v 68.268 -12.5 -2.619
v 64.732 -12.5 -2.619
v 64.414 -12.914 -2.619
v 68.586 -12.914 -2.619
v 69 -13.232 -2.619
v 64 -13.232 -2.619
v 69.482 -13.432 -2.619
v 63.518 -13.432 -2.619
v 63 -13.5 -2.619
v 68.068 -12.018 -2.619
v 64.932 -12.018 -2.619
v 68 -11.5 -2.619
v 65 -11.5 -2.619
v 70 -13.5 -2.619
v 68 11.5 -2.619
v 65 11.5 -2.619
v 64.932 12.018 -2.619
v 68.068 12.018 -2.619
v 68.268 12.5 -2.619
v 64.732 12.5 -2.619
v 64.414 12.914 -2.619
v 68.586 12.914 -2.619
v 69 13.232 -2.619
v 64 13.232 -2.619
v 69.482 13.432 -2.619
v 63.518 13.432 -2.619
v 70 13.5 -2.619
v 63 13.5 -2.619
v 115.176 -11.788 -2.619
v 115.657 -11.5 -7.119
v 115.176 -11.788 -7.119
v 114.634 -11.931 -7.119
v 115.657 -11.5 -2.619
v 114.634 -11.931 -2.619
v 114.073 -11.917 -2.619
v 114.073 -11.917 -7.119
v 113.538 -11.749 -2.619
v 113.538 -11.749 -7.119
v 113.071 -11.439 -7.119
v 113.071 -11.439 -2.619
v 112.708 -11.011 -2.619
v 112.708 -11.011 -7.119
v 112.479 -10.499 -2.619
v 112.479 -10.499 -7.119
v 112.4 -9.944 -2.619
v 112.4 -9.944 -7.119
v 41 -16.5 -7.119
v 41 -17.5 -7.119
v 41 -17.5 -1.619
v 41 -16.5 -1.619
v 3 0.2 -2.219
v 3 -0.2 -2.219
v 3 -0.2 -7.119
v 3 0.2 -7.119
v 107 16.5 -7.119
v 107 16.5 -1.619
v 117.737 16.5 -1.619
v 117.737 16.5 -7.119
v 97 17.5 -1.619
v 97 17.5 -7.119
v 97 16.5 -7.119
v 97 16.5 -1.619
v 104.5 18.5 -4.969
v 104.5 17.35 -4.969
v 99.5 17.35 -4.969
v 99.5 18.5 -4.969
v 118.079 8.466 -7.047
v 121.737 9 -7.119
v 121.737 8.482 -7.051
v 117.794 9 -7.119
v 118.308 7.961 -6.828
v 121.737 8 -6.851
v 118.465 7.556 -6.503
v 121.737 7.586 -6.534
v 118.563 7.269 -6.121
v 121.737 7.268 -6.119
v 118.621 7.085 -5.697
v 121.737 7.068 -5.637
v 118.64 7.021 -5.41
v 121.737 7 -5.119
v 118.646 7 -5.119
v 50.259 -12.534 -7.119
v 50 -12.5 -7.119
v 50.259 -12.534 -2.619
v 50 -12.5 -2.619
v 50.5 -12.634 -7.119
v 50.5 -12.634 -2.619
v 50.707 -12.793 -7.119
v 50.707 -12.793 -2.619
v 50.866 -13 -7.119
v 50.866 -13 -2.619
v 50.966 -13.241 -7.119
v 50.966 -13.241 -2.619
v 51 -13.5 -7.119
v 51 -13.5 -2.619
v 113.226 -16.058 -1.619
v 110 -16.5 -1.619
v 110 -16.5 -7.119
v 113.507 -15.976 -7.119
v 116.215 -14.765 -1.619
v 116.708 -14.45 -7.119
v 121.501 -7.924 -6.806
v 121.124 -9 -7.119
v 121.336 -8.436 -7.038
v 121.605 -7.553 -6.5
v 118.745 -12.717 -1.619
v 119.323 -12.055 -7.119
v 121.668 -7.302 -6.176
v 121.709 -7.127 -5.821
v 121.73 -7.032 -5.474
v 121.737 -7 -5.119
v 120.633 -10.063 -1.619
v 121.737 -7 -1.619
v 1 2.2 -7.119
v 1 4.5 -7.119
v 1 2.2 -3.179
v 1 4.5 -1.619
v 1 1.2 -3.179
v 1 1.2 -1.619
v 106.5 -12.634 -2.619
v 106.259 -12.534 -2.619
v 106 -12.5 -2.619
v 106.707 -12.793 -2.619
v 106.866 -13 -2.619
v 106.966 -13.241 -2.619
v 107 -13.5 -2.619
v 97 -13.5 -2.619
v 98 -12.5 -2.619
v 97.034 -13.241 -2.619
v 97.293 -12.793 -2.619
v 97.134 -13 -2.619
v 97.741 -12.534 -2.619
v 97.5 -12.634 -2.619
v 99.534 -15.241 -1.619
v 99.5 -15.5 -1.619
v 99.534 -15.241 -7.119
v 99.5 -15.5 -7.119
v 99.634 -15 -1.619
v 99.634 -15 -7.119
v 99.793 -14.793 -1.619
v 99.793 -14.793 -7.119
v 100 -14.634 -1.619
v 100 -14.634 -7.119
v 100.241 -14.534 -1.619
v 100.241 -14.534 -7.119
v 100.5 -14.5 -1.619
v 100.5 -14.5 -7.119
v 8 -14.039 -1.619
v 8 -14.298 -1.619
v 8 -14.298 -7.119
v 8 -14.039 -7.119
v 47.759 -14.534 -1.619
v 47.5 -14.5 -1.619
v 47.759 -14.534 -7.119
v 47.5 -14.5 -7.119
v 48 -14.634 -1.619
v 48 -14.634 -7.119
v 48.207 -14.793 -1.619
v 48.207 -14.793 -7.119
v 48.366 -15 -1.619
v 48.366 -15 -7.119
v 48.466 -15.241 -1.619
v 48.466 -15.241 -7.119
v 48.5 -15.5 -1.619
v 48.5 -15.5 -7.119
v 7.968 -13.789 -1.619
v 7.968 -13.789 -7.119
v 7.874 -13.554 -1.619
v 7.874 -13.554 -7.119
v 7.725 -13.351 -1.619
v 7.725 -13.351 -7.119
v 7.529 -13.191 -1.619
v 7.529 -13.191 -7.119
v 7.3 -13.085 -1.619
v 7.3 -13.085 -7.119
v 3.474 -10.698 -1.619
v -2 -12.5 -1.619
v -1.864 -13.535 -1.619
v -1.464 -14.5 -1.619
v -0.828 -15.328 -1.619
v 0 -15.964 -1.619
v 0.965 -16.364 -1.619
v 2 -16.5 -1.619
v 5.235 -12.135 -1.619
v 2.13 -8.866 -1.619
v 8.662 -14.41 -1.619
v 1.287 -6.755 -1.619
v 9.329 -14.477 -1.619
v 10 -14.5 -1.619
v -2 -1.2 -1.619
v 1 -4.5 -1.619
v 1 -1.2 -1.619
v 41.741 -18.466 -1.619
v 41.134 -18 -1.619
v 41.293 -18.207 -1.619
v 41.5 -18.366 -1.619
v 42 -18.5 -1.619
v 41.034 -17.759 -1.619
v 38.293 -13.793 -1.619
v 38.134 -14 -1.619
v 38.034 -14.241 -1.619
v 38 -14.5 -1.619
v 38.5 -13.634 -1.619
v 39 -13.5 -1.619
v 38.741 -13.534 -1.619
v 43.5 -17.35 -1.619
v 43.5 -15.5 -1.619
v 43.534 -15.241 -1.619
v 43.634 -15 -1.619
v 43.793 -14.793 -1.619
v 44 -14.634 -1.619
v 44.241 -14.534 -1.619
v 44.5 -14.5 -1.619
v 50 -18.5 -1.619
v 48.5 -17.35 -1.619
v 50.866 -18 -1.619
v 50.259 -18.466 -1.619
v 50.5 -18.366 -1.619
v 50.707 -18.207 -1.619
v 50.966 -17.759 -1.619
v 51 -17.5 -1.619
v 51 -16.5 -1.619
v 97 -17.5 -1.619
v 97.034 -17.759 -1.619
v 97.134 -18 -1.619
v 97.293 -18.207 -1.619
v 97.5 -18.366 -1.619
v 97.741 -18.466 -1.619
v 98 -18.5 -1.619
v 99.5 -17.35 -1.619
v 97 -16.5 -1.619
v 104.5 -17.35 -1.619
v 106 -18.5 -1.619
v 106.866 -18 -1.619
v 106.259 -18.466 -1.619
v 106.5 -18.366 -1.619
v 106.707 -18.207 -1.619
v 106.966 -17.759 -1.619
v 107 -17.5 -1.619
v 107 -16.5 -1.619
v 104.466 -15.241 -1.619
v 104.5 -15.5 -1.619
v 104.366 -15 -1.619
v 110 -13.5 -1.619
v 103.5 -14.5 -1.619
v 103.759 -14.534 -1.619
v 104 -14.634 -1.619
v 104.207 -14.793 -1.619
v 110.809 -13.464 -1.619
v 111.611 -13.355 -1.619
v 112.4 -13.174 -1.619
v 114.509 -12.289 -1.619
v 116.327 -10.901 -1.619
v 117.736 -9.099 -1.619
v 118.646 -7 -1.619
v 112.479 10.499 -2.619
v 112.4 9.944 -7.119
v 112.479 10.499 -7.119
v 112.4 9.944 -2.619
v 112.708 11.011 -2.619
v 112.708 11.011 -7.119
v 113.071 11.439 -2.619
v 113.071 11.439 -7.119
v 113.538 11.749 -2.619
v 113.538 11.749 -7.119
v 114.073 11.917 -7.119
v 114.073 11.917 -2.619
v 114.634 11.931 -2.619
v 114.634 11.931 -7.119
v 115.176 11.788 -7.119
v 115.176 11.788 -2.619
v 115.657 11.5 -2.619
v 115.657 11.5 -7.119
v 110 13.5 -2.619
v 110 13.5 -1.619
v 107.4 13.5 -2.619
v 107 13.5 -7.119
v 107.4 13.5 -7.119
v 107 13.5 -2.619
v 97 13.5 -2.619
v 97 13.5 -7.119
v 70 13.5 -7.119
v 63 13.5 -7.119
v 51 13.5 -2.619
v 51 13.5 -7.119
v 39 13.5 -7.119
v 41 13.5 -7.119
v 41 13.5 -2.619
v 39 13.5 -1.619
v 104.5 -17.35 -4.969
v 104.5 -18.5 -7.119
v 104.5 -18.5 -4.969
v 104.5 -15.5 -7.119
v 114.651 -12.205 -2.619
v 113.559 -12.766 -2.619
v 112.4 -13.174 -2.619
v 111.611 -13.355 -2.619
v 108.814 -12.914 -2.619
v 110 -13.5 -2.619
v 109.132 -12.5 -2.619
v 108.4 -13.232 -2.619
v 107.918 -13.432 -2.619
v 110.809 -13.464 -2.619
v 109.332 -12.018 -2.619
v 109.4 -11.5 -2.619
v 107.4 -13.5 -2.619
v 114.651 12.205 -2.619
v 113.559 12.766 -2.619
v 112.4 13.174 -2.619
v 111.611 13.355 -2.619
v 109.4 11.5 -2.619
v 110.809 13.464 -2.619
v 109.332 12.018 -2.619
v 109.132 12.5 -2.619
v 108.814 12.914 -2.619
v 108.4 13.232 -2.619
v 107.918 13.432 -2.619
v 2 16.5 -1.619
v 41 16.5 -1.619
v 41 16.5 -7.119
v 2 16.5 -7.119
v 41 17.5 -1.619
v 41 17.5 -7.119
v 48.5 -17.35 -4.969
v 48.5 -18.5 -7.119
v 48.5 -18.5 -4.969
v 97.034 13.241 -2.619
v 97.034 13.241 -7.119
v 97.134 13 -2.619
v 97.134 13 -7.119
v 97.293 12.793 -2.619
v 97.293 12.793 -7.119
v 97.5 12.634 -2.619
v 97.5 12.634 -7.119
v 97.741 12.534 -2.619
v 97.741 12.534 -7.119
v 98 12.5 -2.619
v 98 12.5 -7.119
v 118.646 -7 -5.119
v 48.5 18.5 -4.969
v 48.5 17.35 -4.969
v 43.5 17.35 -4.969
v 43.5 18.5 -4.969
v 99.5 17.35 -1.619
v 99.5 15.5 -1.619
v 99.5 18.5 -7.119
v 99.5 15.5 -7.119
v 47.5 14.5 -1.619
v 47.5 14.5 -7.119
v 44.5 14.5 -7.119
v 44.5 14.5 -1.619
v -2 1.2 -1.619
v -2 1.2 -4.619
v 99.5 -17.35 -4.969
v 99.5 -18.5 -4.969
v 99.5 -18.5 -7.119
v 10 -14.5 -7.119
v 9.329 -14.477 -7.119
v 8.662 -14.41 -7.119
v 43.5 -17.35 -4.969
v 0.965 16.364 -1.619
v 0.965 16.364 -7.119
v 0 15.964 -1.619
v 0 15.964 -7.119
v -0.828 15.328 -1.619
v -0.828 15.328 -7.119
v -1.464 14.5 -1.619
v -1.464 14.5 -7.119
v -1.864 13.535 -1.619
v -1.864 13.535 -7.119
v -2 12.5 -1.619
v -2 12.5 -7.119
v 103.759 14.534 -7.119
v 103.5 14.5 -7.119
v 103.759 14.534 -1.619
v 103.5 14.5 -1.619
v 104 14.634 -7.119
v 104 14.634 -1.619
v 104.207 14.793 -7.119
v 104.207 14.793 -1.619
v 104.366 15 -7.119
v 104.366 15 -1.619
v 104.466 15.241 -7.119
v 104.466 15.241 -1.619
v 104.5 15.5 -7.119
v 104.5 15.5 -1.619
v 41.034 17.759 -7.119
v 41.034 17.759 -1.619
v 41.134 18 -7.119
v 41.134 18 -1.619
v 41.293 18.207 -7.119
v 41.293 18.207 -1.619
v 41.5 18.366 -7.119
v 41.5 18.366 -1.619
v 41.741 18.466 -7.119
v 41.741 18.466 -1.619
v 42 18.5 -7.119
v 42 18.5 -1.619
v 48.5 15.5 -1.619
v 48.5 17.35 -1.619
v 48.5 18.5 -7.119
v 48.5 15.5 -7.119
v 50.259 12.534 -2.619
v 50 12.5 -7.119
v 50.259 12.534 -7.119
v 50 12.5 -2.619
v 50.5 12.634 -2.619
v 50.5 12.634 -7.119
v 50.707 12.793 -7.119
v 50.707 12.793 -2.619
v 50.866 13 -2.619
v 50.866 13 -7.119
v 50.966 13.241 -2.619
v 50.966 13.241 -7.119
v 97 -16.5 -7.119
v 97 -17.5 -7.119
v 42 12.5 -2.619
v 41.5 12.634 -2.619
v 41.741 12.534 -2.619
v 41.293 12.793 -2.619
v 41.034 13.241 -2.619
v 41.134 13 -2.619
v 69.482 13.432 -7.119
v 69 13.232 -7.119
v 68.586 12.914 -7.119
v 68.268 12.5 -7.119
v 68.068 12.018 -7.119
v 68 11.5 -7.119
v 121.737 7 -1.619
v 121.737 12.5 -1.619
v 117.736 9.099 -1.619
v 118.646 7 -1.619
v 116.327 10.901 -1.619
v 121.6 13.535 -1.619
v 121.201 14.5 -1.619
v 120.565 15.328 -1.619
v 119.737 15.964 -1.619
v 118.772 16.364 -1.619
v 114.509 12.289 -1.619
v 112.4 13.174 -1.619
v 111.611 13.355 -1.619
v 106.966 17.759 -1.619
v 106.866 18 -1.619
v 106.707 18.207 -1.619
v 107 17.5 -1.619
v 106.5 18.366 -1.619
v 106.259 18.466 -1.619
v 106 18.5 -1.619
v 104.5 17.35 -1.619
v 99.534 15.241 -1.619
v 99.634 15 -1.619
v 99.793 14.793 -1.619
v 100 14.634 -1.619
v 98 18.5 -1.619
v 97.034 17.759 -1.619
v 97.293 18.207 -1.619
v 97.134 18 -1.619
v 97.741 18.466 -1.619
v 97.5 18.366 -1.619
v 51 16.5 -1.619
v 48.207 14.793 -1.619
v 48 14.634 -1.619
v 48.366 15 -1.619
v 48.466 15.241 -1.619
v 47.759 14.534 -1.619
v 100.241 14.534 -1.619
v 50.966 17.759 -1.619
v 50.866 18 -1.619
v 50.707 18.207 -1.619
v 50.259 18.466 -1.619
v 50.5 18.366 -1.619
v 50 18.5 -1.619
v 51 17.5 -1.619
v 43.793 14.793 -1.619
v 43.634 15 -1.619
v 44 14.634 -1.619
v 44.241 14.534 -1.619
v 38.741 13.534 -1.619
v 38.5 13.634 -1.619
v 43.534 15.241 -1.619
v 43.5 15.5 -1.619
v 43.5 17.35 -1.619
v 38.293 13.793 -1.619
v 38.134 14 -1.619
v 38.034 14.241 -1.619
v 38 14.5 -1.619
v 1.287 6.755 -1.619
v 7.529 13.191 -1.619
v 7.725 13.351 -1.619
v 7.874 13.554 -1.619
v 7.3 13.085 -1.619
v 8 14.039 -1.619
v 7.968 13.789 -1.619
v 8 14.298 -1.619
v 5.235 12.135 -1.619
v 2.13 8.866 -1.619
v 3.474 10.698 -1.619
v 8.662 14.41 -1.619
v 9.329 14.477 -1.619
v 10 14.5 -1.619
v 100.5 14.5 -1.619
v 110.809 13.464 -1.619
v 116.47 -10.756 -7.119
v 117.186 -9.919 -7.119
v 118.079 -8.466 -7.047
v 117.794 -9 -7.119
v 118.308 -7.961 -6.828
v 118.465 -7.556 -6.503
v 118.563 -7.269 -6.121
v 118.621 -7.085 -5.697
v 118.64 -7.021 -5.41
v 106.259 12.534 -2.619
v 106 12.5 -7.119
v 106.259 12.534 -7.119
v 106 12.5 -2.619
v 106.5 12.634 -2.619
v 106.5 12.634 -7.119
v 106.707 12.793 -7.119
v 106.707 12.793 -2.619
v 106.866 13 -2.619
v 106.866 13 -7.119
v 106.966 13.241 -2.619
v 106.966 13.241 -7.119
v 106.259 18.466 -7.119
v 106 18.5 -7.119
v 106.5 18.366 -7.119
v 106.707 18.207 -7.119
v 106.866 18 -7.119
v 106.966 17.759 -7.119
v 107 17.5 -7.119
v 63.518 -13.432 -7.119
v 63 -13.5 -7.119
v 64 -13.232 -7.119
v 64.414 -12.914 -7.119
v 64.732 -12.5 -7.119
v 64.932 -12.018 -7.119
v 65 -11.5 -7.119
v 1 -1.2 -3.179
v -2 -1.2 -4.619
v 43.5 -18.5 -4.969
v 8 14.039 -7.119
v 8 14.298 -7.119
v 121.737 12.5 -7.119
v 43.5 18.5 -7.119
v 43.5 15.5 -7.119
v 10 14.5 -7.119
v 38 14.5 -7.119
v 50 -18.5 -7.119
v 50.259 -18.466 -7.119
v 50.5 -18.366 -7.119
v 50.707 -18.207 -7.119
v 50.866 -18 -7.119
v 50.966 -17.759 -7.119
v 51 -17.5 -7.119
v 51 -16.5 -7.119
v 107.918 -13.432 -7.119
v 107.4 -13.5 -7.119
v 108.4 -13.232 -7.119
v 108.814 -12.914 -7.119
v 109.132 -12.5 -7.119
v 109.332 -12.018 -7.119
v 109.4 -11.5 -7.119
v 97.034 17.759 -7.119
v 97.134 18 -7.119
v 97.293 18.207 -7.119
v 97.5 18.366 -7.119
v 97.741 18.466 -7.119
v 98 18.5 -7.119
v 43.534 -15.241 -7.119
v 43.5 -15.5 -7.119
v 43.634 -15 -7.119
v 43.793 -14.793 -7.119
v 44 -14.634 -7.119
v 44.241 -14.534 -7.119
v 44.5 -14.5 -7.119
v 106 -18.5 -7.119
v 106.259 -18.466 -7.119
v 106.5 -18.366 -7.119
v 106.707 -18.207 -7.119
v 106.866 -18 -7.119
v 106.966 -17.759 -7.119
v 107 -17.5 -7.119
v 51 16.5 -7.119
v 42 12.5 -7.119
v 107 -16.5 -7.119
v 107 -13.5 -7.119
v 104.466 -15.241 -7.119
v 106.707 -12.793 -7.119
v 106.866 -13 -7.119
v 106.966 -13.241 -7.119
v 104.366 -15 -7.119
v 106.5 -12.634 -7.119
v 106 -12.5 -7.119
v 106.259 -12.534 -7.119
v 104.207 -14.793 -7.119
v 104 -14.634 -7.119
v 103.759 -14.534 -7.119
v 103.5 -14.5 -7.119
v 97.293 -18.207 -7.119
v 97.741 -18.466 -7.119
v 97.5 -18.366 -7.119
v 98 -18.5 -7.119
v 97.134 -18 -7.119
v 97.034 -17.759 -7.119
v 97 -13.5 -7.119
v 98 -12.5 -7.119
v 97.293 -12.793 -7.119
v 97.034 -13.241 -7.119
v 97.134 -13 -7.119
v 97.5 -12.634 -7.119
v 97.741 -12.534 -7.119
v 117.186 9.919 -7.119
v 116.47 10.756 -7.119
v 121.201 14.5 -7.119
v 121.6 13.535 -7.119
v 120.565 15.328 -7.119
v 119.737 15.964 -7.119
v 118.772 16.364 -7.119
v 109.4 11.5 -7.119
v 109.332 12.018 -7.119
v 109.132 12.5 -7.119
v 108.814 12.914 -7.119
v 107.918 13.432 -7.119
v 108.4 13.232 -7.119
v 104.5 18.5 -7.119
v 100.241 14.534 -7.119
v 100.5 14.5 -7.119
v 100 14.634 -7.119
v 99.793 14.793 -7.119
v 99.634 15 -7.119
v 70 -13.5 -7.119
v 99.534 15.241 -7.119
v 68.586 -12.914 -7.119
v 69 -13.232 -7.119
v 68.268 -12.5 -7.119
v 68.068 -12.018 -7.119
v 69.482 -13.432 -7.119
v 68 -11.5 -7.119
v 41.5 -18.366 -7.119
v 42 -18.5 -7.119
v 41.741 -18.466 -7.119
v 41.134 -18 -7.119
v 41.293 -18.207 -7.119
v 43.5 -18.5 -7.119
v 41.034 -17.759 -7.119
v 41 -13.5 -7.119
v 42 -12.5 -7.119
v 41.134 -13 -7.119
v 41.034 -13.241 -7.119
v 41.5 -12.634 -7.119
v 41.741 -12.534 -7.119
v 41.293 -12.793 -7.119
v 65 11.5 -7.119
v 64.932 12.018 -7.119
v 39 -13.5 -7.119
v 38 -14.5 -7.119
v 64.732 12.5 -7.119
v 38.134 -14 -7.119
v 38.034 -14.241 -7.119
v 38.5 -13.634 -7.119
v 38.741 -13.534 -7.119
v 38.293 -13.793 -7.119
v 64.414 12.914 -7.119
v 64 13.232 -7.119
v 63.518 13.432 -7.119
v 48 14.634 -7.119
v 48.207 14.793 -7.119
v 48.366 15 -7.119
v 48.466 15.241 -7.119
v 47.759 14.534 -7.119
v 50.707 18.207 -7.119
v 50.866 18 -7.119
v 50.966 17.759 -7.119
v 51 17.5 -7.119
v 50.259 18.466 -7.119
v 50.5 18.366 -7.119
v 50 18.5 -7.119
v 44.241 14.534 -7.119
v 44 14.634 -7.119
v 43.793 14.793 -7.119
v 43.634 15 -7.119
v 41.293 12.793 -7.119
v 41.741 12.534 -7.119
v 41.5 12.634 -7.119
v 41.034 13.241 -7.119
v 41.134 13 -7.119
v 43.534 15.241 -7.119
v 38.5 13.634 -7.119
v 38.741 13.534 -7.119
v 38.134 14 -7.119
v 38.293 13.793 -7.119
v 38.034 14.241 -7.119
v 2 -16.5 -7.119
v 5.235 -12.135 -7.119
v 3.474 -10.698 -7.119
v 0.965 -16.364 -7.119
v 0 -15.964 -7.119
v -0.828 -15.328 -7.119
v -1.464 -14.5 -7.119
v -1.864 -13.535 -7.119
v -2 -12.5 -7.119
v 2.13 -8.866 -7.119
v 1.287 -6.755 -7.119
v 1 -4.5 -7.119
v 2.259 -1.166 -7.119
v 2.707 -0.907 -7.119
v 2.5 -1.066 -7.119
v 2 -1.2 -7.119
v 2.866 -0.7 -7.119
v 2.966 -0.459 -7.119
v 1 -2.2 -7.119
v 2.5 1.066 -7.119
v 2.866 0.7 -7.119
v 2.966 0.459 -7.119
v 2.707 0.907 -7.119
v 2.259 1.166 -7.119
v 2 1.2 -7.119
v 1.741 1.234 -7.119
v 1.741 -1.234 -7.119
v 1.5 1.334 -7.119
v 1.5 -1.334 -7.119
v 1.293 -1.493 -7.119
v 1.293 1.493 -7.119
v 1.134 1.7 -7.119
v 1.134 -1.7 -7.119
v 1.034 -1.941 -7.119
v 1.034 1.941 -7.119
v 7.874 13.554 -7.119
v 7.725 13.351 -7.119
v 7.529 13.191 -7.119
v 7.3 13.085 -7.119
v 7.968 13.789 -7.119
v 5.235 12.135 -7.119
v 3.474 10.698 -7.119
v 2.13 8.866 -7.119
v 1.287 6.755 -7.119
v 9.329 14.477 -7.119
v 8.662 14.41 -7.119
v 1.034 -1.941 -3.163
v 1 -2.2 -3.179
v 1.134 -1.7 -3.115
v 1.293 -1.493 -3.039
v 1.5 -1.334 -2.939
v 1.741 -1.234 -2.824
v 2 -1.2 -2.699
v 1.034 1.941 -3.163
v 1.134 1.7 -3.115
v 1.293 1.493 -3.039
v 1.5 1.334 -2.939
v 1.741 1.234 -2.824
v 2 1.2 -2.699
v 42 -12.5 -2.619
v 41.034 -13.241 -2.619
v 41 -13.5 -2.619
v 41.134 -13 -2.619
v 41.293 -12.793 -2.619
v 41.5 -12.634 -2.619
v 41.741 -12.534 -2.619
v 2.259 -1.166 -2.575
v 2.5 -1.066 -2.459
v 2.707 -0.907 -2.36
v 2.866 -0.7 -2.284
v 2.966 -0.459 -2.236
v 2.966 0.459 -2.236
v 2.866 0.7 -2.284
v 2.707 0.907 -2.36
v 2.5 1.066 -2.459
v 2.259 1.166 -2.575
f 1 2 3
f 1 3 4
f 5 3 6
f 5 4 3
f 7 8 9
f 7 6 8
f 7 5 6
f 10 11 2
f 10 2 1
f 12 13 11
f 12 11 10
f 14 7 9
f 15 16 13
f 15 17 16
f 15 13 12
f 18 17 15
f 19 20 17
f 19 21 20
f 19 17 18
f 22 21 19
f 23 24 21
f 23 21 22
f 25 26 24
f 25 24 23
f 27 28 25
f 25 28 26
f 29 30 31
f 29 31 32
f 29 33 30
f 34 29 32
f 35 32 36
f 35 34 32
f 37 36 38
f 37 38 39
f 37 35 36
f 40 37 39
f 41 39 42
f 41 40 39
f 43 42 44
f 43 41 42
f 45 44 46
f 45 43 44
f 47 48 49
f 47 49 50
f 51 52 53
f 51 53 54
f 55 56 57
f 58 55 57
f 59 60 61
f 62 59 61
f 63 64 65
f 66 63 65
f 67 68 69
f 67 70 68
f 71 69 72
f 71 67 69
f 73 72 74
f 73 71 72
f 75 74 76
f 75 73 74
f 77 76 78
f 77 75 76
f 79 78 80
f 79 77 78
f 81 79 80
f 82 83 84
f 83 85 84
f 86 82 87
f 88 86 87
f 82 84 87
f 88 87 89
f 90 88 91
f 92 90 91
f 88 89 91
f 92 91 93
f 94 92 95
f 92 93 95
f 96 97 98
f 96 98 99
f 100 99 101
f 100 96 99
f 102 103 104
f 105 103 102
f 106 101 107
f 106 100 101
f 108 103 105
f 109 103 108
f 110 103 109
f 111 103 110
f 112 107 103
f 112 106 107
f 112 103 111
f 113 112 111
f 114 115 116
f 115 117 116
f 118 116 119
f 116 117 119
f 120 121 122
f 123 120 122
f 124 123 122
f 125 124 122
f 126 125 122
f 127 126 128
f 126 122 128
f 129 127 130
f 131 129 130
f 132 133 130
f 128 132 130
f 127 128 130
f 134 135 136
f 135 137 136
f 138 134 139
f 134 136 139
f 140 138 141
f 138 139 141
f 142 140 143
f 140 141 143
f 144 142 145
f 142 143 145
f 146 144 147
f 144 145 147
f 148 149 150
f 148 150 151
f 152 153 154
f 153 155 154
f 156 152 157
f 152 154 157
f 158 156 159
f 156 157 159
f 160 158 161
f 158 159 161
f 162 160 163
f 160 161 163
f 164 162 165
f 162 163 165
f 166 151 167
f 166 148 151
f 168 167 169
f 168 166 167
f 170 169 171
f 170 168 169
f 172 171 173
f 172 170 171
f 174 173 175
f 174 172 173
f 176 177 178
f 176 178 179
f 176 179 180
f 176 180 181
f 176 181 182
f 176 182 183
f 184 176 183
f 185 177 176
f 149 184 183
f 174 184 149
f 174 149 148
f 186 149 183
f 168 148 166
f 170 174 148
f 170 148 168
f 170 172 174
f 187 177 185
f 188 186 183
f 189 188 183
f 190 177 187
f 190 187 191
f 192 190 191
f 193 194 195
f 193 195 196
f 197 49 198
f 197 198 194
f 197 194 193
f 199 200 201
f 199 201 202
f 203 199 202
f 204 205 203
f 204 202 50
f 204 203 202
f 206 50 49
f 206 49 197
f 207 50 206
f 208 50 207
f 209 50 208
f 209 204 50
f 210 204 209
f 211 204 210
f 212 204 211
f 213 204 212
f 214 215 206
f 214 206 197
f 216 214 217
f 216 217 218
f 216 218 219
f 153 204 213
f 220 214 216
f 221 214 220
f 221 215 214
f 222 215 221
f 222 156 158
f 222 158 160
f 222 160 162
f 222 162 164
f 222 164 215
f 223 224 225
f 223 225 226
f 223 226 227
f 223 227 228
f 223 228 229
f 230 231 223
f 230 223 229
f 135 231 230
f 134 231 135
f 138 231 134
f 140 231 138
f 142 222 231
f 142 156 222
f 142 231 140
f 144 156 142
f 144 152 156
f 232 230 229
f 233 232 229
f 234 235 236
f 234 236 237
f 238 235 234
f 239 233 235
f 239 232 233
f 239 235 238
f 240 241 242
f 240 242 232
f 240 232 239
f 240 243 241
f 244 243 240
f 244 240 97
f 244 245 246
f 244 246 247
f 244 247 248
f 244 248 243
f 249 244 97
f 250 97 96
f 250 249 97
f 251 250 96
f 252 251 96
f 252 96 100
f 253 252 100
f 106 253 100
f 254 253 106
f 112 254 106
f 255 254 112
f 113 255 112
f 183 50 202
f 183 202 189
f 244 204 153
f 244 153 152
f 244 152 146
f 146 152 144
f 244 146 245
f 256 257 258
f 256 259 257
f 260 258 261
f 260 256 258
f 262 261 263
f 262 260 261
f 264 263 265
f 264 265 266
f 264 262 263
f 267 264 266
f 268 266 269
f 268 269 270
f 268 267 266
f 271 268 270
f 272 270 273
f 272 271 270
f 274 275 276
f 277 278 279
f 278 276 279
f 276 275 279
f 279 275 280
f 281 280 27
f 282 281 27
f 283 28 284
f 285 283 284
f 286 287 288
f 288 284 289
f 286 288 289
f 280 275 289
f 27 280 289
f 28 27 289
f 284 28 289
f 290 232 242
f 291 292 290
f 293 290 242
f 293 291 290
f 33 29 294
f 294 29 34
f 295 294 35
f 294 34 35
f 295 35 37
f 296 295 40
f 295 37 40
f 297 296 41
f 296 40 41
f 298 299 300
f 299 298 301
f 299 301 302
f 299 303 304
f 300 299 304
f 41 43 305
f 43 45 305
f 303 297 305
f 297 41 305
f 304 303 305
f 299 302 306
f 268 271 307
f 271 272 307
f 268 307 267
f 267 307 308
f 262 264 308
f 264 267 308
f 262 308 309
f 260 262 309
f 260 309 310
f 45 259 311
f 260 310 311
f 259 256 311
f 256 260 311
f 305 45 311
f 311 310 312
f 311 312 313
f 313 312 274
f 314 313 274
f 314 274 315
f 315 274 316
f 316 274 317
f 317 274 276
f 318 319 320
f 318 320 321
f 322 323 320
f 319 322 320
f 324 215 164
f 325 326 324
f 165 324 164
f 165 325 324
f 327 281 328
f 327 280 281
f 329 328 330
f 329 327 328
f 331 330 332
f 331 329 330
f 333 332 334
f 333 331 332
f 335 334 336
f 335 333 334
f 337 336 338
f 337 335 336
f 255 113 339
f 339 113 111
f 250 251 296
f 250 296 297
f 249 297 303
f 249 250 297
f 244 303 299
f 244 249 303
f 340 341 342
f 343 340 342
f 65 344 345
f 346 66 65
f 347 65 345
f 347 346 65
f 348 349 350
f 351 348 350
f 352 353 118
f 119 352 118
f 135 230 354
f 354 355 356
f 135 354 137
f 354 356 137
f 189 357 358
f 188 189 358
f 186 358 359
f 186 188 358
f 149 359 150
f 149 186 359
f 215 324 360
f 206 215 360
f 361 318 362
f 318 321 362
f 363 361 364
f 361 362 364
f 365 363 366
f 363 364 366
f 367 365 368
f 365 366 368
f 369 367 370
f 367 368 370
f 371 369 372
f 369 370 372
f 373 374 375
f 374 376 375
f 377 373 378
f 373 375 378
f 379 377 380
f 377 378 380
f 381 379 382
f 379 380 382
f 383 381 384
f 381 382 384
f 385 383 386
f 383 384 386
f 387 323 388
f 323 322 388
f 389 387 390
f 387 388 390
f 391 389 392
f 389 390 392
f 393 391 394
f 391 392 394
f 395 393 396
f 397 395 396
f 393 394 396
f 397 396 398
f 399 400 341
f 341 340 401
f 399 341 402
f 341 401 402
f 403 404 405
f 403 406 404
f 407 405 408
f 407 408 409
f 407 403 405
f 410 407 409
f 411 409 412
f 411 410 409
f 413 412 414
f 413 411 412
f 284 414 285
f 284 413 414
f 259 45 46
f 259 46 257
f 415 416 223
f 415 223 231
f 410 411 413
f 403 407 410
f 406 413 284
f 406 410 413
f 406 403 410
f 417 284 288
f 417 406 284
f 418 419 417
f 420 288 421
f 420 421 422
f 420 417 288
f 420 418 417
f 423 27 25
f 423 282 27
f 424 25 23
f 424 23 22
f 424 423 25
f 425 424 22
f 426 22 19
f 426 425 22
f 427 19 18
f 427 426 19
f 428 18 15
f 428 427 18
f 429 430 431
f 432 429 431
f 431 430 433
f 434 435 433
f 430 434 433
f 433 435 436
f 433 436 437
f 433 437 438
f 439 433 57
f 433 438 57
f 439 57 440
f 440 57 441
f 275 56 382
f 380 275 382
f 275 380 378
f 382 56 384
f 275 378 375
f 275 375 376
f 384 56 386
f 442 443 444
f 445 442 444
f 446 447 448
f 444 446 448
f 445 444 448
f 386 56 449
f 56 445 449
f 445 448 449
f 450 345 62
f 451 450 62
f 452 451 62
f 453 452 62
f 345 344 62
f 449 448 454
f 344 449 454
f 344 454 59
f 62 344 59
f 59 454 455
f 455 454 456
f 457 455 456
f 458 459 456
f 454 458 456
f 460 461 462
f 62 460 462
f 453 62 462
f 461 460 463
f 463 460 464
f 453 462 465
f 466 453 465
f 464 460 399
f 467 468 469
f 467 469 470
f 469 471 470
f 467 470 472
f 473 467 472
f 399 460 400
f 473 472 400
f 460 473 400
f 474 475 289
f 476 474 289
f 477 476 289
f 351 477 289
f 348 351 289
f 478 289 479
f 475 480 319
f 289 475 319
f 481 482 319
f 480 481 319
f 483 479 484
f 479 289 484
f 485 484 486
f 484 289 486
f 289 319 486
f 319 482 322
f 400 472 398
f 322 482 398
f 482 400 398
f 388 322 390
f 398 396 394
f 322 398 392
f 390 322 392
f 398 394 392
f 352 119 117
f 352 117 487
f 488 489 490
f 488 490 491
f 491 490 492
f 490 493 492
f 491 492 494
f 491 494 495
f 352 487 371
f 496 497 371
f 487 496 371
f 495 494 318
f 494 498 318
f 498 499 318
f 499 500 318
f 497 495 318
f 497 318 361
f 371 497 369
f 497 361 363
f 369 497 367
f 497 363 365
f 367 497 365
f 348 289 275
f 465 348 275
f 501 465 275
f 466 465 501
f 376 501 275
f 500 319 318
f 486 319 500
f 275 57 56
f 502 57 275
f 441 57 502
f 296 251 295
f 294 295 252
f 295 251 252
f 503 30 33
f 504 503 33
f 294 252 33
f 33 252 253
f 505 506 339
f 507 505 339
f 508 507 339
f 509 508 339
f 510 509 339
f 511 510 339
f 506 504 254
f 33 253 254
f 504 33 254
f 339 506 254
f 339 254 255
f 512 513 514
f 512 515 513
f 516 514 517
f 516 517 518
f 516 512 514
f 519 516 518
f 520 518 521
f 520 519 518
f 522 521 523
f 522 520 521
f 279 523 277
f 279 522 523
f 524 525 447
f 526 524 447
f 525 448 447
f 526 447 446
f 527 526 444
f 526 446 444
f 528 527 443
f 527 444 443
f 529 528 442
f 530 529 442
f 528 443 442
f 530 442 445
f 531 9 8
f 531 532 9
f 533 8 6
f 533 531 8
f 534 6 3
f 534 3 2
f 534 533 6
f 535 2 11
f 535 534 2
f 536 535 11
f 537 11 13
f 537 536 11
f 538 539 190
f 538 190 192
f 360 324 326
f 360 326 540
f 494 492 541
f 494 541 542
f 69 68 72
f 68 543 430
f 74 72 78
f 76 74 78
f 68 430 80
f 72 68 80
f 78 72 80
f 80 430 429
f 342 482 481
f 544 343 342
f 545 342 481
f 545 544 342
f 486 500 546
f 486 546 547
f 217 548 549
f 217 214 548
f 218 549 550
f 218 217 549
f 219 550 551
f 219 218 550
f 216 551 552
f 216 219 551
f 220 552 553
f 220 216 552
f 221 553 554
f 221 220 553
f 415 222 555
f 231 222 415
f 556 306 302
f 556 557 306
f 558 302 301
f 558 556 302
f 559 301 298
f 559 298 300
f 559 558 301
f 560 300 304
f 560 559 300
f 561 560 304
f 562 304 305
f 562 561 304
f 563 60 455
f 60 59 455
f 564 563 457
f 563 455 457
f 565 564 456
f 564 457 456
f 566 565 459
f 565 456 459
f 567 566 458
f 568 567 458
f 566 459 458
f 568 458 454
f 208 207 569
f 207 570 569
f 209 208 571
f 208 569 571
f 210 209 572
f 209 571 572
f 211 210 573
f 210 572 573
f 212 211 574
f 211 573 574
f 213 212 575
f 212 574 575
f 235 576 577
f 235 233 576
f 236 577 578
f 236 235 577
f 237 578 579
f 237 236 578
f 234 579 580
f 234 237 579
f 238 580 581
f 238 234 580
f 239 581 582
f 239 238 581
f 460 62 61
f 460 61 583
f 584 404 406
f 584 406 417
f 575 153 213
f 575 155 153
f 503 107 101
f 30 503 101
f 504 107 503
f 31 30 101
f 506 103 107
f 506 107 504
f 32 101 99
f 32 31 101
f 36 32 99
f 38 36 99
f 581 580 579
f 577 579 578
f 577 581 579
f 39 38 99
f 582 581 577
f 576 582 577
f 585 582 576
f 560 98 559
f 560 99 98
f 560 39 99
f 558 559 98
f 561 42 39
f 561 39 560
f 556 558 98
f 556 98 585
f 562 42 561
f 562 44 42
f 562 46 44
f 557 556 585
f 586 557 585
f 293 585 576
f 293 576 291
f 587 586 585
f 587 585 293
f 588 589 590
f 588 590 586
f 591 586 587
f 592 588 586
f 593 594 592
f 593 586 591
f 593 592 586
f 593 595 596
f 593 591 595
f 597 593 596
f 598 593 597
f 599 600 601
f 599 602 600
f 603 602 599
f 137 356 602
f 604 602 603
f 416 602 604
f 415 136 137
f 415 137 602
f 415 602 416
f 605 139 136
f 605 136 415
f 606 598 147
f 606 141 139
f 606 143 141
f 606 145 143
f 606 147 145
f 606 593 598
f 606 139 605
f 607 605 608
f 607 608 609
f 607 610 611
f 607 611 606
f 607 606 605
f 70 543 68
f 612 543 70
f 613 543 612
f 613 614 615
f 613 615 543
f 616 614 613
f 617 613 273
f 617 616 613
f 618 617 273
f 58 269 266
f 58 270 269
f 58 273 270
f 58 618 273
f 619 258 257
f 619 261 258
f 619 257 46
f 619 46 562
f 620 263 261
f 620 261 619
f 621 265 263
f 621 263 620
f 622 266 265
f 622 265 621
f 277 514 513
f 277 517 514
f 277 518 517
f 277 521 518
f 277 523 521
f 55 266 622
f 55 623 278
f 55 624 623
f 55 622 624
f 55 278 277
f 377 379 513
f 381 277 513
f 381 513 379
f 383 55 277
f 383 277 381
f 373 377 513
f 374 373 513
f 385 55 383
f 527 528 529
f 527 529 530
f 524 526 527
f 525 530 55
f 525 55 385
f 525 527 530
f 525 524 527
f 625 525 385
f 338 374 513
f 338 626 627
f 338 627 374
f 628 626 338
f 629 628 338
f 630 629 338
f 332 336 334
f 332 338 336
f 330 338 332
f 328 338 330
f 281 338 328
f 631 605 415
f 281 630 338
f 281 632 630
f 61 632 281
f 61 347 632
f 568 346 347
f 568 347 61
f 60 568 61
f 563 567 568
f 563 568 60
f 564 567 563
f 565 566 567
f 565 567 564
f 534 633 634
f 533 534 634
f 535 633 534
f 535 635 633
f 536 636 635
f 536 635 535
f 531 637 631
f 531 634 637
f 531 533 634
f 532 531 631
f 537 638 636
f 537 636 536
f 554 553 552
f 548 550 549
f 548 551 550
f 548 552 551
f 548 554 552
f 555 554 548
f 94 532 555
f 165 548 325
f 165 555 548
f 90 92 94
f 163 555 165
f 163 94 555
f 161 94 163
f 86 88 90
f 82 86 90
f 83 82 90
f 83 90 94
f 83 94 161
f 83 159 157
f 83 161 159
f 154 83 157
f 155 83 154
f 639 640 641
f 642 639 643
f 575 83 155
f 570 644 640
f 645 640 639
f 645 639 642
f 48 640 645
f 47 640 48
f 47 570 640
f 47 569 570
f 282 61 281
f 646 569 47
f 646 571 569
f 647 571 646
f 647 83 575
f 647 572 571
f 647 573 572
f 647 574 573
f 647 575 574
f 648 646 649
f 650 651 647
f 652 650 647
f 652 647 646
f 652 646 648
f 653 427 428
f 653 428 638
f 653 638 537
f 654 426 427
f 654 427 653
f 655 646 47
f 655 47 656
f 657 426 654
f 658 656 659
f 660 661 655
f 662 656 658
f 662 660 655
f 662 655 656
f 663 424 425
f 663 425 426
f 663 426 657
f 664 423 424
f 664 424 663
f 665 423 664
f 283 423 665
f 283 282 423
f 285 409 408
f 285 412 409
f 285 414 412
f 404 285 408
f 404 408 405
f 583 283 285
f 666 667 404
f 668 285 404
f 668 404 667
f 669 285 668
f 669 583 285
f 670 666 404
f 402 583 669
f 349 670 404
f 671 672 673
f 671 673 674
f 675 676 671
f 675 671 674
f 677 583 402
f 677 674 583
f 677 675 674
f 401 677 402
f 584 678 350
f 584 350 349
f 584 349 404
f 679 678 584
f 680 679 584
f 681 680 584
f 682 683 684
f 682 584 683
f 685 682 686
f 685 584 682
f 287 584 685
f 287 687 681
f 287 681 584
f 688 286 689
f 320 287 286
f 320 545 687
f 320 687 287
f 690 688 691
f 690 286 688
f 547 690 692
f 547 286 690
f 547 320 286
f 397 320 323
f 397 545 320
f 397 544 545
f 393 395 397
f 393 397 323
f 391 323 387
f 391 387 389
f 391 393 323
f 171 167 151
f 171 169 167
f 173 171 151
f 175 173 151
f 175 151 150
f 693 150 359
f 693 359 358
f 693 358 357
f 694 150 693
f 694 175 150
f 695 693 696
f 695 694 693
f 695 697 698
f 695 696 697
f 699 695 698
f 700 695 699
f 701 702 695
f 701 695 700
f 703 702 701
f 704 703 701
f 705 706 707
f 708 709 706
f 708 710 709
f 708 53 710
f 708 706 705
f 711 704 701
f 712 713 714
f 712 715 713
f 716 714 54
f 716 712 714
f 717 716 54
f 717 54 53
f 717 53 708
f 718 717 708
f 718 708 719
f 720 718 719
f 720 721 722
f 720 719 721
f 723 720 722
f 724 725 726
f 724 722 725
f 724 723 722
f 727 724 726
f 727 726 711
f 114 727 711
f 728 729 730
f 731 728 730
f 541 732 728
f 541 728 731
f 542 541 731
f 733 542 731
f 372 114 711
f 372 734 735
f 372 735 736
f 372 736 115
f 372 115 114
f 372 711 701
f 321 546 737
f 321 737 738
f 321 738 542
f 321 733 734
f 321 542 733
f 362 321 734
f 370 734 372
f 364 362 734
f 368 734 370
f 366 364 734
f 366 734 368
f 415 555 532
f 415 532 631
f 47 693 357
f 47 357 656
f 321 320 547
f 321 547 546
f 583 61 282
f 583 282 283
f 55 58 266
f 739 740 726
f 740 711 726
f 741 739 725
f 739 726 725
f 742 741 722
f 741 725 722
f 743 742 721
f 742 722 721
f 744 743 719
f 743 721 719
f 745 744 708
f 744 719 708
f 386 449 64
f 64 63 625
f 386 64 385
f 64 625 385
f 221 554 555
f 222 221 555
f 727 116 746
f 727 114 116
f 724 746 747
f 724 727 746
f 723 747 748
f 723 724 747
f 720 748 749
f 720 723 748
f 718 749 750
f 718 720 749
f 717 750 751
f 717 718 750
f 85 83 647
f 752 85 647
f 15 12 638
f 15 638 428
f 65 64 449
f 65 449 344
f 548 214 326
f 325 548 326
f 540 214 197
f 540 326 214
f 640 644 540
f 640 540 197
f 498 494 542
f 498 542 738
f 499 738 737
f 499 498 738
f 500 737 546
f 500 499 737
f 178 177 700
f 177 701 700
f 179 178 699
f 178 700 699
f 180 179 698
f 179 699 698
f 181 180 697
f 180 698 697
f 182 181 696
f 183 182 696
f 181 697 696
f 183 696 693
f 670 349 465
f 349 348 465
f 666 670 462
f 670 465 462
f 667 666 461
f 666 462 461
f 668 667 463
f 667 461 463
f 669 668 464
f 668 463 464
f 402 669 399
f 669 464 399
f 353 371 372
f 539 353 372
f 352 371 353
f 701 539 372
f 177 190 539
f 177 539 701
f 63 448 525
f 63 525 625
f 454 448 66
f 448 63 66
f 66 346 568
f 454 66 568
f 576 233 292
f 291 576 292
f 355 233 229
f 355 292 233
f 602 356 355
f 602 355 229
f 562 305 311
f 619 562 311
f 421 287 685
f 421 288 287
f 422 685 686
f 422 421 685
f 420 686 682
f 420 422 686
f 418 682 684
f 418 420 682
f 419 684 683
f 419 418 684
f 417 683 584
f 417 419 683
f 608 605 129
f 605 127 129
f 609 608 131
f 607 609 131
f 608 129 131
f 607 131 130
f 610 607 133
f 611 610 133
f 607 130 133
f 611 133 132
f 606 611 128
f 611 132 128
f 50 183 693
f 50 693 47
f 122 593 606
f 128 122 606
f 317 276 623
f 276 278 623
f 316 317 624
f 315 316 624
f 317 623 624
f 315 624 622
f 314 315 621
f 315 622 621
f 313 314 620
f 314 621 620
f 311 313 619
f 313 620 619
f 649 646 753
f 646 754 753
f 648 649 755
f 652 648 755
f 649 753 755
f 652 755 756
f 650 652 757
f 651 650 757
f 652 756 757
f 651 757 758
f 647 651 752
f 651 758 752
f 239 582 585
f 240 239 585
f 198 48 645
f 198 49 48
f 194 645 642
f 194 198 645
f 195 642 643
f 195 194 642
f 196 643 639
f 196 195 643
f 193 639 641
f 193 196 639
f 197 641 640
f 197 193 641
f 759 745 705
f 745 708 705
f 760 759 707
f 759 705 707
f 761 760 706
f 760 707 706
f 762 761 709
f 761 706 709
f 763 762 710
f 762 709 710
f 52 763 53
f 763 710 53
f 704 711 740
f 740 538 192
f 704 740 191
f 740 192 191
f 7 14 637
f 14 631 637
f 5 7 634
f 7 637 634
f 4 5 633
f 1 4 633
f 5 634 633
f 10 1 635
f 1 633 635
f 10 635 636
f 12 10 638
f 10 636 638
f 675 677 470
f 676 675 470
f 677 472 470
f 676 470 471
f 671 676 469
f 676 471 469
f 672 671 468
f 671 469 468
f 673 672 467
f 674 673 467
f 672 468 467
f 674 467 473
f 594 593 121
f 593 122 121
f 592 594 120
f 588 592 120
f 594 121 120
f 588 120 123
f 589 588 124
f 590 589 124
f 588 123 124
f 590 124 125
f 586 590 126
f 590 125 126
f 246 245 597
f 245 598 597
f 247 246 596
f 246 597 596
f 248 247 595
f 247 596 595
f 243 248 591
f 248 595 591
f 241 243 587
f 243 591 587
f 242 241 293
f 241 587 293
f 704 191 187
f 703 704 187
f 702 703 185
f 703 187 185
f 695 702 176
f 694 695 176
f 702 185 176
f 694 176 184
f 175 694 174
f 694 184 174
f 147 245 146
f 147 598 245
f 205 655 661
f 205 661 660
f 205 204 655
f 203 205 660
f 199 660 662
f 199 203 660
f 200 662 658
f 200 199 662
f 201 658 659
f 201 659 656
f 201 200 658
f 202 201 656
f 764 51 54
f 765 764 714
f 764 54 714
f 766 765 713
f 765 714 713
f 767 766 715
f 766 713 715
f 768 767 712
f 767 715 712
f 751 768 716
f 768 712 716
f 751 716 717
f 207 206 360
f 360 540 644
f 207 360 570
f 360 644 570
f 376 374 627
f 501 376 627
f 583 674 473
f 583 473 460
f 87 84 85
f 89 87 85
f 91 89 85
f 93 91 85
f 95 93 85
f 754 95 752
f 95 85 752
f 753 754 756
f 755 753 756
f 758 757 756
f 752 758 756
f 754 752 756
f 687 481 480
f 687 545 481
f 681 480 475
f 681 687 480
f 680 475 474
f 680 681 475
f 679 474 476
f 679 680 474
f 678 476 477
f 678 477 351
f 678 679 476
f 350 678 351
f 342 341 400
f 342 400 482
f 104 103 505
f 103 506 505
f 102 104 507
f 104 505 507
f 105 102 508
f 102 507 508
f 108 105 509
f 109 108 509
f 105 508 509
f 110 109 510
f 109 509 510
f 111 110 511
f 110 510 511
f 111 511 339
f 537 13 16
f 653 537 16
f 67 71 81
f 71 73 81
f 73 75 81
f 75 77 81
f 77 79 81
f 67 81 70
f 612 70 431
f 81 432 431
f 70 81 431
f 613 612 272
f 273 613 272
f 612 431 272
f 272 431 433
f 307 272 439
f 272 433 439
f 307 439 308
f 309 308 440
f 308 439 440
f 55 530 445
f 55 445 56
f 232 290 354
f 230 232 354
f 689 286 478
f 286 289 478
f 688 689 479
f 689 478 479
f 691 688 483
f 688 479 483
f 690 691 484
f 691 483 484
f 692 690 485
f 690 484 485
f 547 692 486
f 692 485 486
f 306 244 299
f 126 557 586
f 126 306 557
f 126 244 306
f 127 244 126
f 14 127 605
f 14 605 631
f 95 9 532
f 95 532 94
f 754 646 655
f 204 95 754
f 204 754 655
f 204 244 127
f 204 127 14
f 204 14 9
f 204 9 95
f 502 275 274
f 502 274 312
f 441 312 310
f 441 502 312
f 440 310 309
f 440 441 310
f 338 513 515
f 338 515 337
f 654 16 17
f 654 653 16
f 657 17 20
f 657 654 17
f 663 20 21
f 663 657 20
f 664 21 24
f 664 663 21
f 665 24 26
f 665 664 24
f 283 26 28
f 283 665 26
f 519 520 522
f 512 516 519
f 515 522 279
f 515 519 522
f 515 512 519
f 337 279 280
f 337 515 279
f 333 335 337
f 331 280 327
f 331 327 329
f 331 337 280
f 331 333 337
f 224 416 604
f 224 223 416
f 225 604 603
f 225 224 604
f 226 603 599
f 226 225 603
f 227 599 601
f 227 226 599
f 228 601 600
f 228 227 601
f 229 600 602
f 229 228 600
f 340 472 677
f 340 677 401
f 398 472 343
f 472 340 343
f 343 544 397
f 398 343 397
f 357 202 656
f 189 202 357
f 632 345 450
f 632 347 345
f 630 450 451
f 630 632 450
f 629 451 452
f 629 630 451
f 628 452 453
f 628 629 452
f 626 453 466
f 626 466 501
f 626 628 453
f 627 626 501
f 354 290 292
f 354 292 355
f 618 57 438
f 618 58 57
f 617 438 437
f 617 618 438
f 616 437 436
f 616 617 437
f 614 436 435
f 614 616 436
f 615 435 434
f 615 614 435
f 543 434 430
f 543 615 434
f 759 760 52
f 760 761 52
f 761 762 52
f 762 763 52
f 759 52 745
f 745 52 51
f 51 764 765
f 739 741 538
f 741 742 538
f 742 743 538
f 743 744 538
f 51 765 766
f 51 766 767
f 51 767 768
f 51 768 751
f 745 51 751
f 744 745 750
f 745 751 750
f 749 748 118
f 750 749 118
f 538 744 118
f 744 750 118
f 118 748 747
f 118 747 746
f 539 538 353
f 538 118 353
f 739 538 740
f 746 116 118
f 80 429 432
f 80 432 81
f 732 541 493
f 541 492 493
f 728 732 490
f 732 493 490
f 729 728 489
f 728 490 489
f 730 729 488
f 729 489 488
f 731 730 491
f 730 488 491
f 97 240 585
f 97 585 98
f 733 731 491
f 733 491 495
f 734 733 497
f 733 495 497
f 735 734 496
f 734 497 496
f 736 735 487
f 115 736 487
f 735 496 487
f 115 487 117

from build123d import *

# Parameters (mm, degrees)
BOSS_EXTRUDE2_DEPTH                        = 5.5
SKETCH4_W                                  = 3
SKETCH4_H                                  = 27
BOSS_EXTRUDE4_CROSS_STRUCTURES_DEPTH       = 5.5
SKETCH6_W                                  = 3
SKETCH6_H                                  = 27
CUT_EXTRUDE3_1_MM_SPACING_DEPTH            = 1
CUT_EXTRUDE4_ELECTRONICS_SPACING_DEPTH     = 124.233518168
SKETCH8_W                                  = 5.5
SKETCH8_H                                  = 14
CUT_EXTRUDE2_USB_C_CUTOUT_DEPTH            = 5
SKETCH10_W                                 = 2
SKETCH10_H                                 = 2.4
BOSS_EXTRUDE3_DEPTH                        = 5.5
CUT_EXTRUDE1_LED_OPENING_DEPTH             = 1.2
SKETCH12_W                                 = 10
SKETCH12_H                                 = 2
BOSS_EXTRUDE4_SNAP_BUMPS_DEPTH             = 5.5
SKETCH13_W                                 = 5
SKETCH13_H                                 = 4
CUT_EXTRUDE2_SNAP_SEAT_2_15_ORIGINAL_DEPTH = 2.15
SKETCH14_W                                 = 5
SKETCH14_H                                 = 2.85
CUT_EXTRUDE3_SNAP_POST_CUT_DEPTH           = 124.179930633
SKETCH15_W                                 = 10
SKETCH15_H                                 = 1
BOSS_EXTRUDE4_DEPTH                        = 4.5
FILLET3_R                                  = 1
FILLET4_R                                  = 1
FILLET5_R                                  = 2
FILLET6_SNAP_FEATURES_R                    = 1
BOSS_EXTRUDE7_DEPTH                        = 5.5
FILLET7_R                                  = 4
FILLET8_R                                  = 2


with BuildPart() as part:
    # Sketch3 → Boss-Extrude2 (new body)
    with BuildSketch(Plane.XY.offset(-1.6194024)):
        with BuildLine():
            Line((110, 16.5), (10, 16.5))
            ThreePointArc((10, 16.5), (1.514718626, 12.985281374), (-2, 4.5))
            Line((-2, 4.5), (-2, -4.5))
            ThreePointArc((-2, -4.5), (1.514718626, -12.985281374), (10, -16.5))
            Line((10, -16.5), (110, -16.5))
            ThreePointArc((110, -16.5), (118.485281374, -12.985281374), (122, -4.5))
            Line((122, -4.5), (122, 4.5))
            ThreePointArc((122, 4.5), (118.485281374, 12.985281374), (110, 16.5))
        make_face()
        with BuildLine():
            Line((119, -4.5), (119, 4.5))
            ThreePointArc((119, 4.5), (116.363961031, 10.863961031), (110, 13.5))
            Line((110, 13.5), (10, 13.5))
            ThreePointArc((10, 13.5), (3.636038969, 10.863961031), (1, 4.5))
            Line((1, 4.5), (1, -4.5))
            ThreePointArc((1, -4.5), (3.636038969, -10.863961031), (10, -13.5))
            Line((10, -13.5), (110, -13.5))
            ThreePointArc((110, -13.5), (116.363961031, -10.863961031), (119, -4.5))
        make_face(mode=Mode.SUBTRACT)
    extrude(amount=-BOSS_EXTRUDE2_DEPTH)

    # Sketch4 → Boss-Extrude4 - cross structures (add)
    with BuildSketch(Plane.XY.offset(-1.6194024)):
        with Locations((110.9, 0)):
            Rectangle(SKETCH4_W, SKETCH4_H)
        with Locations((66.5, 0)):
            Rectangle(SKETCH4_W, SKETCH4_H)
    extrude(amount=-BOSS_EXTRUDE4_CROSS_STRUCTURES_DEPTH)

    # Sketch6 → Cut-Extrude3 - 1 mm spacing (cut)
    with BuildSketch(Plane.XY.offset(-1.6194024)):
        with BuildLine():
            Line((109.4, 13.5), (110, 13.5))
            ThreePointArc((110, 13.5), (111.211013131, 13.418152678), (112.4, 13.174099377))
            Line((112.4, 13.174099377), (112.4, -13.174099377))
            ThreePointArc((112.4, -13.174099377), (111.211013131, -13.418152678), (110, -13.5))
            Line((110, -13.5), (109.4, -13.5))
            Line((109.4, -13.5), (109.4, 13.5))
        make_face()
        with Locations((66.5, 0)):
            Rectangle(SKETCH6_W, SKETCH6_H)
    extrude(amount=-CUT_EXTRUDE3_1_MM_SPACING_DEPTH, mode=Mode.SUBTRACT)

    # Sketch7 → Cut-Extrude4 - electronics spacing (cut, through all)
    with BuildSketch(Plane.XY.offset(-1.6194024)):
        with BuildLine():
            Line((38, -14.5), (10, -14.5))
            ThreePointArc((10, -14.5), (8.99491038, -14.44936153), (8, -14.297958971))
            Line((8, -14.297958971), (8, 14.297958971))
            ThreePointArc((8, 14.297958971), (8.99491038, 14.44936153), (10, 14.5))
            Line((10, 14.5), (38, 14.5))
            Line((38, 14.5), (38, -14.5))
        make_face()
    extrude(amount=-CUT_EXTRUDE4_ELECTRONICS_SPACING_DEPTH, mode=Mode.SUBTRACT)

    # Sketch8 → Cut-Extrude2 - USB-C cutout (cut)
    with BuildSketch(Plane(origin=(122, 0, 0), x_dir=(0, 0, -1), z_dir=(1, 0, 0))):
        with Locations((4.3694024, 0)):
            Rectangle(SKETCH8_W, SKETCH8_H)
    extrude(amount=-CUT_EXTRUDE2_USB_C_CUTOUT_DEPTH, mode=Mode.SUBTRACT)

    # Sketch10 → Boss-Extrude3 (add)
    with BuildSketch(Plane.XY.offset(-1.6194024)):
        with Locations((2, 0)):
            Rectangle(SKETCH10_W, SKETCH10_H)
    extrude(amount=-BOSS_EXTRUDE3_DEPTH)

    # Sketch11 → Cut-Extrude1 - LED opening (cut, symmetric)
    with BuildSketch(Plane(origin=(0, 0, 0), x_dir=(1, 0, 0), z_dir=(0, 1, 0))):
        Polygon((3, 2.2194024), (-2, 4.6194024), (-2, 1.6194024), (3, 1.6194024), align=None)
    extrude(amount=CUT_EXTRUDE1_LED_OPENING_DEPTH, both=True, mode=Mode.SUBTRACT)

    # Sketch12 → Boss-Extrude4 - snap bumps (add)
    with BuildSketch(Plane(origin=(0, 0, -7.1194024), x_dir=(-1, 0, 0), z_dir=(0, 0, -1))):
        with Locations((-46, -17.5)):
            Rectangle(SKETCH12_W, SKETCH12_H)
        with Locations((-102, -17.5)):
            Rectangle(SKETCH12_W, SKETCH12_H)
    boss_extrude4_snap_bumps = extrude(amount=-BOSS_EXTRUDE4_SNAP_BUMPS_DEPTH)

    # Sketch13 → Cut-Extrude2 - snap seat (2.15, original is 2.0) (cut)
    with BuildSketch(Plane(origin=(0, 0, -7.1194024), x_dir=(-1, 0, 0), z_dir=(0, 0, -1))):
        with Locations((-46, -16.5)):
            Rectangle(SKETCH13_W, SKETCH13_H)
        with Locations((-102, -16.5)):
            Rectangle(SKETCH13_W, SKETCH13_H)
    cut_extrude2_snap_seat_2_15_original = extrude(amount=-CUT_EXTRUDE2_SNAP_SEAT_2_15_ORIGINAL_DEPTH, mode=Mode.SUBTRACT)

    # Sketch14 → Cut-Extrude3 - snap post cut (cut, through all)
    with BuildSketch(Plane(origin=(0, 0, -4.9694024), x_dir=(-1, 0, 0), z_dir=(0, 0, -1))):
        with Locations((-46, -15.925)):
            Rectangle(SKETCH14_W, SKETCH14_H)
        with Locations((-102, -15.925)):
            Rectangle(SKETCH14_W, SKETCH14_H)
    cut_extrude3_snap_post_cut = extrude(amount=-CUT_EXTRUDE3_SNAP_POST_CUT_DEPTH, mode=Mode.SUBTRACT)

    # Sketch15 → Boss-Extrude4 (add)
    with BuildSketch(Plane(origin=(0, 0, -7.1194024), x_dir=(-1, 0, 0), z_dir=(0, 0, -1))):
        with Locations((-46, -13)):
            Rectangle(SKETCH15_W, SKETCH15_H)
        with Locations((-102, -13)):
            Rectangle(SKETCH15_W, SKETCH15_H)
    boss_extrude4 = extrude(amount=-BOSS_EXTRUDE4_DEPTH)

    # Mirror1: Boss-Extrude4 - snap bumps, Cut-Extrude2 - snap seat (2.15, original is 2.0), Cut-Extrude3 - snap post cut, Boss-Extrude4 across plane
    add(boss_extrude4_snap_bumps.mirror(Plane.ZX))
    add(cut_extrude2_snap_seat_2_15_original.mirror(Plane.ZX), mode=Mode.SUBTRACT)
    add(cut_extrude3_snap_post_cut.mirror(Plane.ZX), mode=Mode.SUBTRACT)
    add(boss_extrude4.mirror(Plane.ZX))

    # Fillet3
    fillet3_edges = [part.edges().sort_by_distance(p)[0] for p in [
        (38, 13.5, -4.3694024),
        (38, -13.5, -4.3694024),
        (8, -13.274964387, -4.3694024),
        (8, 13.274964387, -4.3694024),
    ]]
    fillet(fillet3_edges, radius=FILLET3_R - 0.0001)  # a hair under: the kernel refuses the full size

    # Fillet4
    fillet4_edges = [part.edges().sort_by_distance(p)[0] for p in [
        (1, 1.2, -5.1494024),
        (3, 1.2, -4.6694024),
        (3, -1.2, -4.6694024),
        (1, -1.2, -5.1494024),
    ]]
    fillet(fillet4_edges, radius=FILLET4_R - 0.0001)  # a hair under: the kernel refuses the full size

    # Fillet5
    fillet5_edges = [part.edges().sort_by_distance(p)[0] for p in [
        (112.4, -13.174099377, -4.8694024),
        (109.4, -13.5, -4.8694024),
        (109.4, 13.5, -4.8694024),
        (65, -13.5, -4.8694024),
        (65, 13.5, -4.8694024),
        (68, 13.5, -4.8694024),
        (68, -13.5, -4.8694024),
        (112.4, 13.174099377, -4.8694024),
    ]]
    fillet(fillet5_edges, radius=FILLET5_R)

    # Fillet6 - snap features
    fillet6_snap_features_edges = [part.edges().sort_by_distance(p)[0] for p in [
        (51, -18.5, -4.3694024),
        (41, -18.5, -4.3694024),
        (107, -18.5, -4.3694024),
        (97, -18.5, -4.3694024),
        (43.5, -14.5, -4.3694024),
        (48.5, -14.5, -4.3694024),
        (99.5, -14.5, -4.3694024),
        (104.5, -14.5, -4.3694024),
        (51, -12.5, -4.8694024),
        (41, -12.5, -4.8694024),
        (107, -12.5, -4.8694024),
        (97, -12.5, -4.8694024),
        (41, 18.5, -4.3694024),
        (51, 18.5, -4.3694024),
        (97, 18.5, -4.3694024),
        (107, 18.5, -4.3694024),
        (43.5, 14.5, -4.3694024),
        (48.5, 14.5, -4.3694024),
        (99.5, 14.5, -4.3694024),
        (104.5, 14.5, -4.3694024),
        (41, 12.5, -4.8694024),
        (51, 12.5, -4.8694024),
        (97, 12.5, -4.8694024),
        (107, 12.5, -4.8694024),
    ]]
    fillet(fillet6_snap_features_edges, radius=FILLET6_SNAP_FEATURES_R - 0.0001)  # a hair under: the kernel refuses the full size

    # Sketch18 → Boss-Extrude7 (add)
    with BuildSketch(Plane.XY.offset(-1.6194024)):
        with BuildLine():
            Line((110, 16.5), (121.736694594, 16.5))
            Line((121.736694594, 16.5), (121.736694594, 7))
            ThreePointArc((121.736694594, 7), (117.549834435, 13.827379053), (110, 16.5))
        make_face()
        with BuildLine():
            Line((-2, 4.5), (-2, 16.5))
            Line((-2, 16.5), (10, 16.5))
            ThreePointArc((10, 16.5), (1.514718626, 12.985281374), (-2, 4.5))
        make_face()
        with BuildLine():
            Line((-2, -4.5), (-2, -16.5))
            Line((-2, -16.5), (10, -16.5))
            ThreePointArc((10, -16.5), (1.514718626, -12.985281374), (-2, -4.5))
        make_face()
    extrude(amount=-BOSS_EXTRUDE7_DEPTH)

    # Fillet7
    fillet7_edges = [part.edges().sort_by_distance(p)[0] for p in [
        (121.736694594, 16.5, -4.3694024),
        (-2, 16.5, -4.3694024),
        (-2, -16.5, -4.3694024),
    ]]
    fillet(fillet7_edges, radius=FILLET7_R)

    # Fillet8
    fillet8_edges = [part.edges().sort_by_distance(p)[0] for p in [
        (120.191251414, 7, -7.1194024),
        (120.191251414, -7, -7.1194024),
    ]]
    fillet(fillet8_edges, radius=FILLET8_R)


solid = part.part
